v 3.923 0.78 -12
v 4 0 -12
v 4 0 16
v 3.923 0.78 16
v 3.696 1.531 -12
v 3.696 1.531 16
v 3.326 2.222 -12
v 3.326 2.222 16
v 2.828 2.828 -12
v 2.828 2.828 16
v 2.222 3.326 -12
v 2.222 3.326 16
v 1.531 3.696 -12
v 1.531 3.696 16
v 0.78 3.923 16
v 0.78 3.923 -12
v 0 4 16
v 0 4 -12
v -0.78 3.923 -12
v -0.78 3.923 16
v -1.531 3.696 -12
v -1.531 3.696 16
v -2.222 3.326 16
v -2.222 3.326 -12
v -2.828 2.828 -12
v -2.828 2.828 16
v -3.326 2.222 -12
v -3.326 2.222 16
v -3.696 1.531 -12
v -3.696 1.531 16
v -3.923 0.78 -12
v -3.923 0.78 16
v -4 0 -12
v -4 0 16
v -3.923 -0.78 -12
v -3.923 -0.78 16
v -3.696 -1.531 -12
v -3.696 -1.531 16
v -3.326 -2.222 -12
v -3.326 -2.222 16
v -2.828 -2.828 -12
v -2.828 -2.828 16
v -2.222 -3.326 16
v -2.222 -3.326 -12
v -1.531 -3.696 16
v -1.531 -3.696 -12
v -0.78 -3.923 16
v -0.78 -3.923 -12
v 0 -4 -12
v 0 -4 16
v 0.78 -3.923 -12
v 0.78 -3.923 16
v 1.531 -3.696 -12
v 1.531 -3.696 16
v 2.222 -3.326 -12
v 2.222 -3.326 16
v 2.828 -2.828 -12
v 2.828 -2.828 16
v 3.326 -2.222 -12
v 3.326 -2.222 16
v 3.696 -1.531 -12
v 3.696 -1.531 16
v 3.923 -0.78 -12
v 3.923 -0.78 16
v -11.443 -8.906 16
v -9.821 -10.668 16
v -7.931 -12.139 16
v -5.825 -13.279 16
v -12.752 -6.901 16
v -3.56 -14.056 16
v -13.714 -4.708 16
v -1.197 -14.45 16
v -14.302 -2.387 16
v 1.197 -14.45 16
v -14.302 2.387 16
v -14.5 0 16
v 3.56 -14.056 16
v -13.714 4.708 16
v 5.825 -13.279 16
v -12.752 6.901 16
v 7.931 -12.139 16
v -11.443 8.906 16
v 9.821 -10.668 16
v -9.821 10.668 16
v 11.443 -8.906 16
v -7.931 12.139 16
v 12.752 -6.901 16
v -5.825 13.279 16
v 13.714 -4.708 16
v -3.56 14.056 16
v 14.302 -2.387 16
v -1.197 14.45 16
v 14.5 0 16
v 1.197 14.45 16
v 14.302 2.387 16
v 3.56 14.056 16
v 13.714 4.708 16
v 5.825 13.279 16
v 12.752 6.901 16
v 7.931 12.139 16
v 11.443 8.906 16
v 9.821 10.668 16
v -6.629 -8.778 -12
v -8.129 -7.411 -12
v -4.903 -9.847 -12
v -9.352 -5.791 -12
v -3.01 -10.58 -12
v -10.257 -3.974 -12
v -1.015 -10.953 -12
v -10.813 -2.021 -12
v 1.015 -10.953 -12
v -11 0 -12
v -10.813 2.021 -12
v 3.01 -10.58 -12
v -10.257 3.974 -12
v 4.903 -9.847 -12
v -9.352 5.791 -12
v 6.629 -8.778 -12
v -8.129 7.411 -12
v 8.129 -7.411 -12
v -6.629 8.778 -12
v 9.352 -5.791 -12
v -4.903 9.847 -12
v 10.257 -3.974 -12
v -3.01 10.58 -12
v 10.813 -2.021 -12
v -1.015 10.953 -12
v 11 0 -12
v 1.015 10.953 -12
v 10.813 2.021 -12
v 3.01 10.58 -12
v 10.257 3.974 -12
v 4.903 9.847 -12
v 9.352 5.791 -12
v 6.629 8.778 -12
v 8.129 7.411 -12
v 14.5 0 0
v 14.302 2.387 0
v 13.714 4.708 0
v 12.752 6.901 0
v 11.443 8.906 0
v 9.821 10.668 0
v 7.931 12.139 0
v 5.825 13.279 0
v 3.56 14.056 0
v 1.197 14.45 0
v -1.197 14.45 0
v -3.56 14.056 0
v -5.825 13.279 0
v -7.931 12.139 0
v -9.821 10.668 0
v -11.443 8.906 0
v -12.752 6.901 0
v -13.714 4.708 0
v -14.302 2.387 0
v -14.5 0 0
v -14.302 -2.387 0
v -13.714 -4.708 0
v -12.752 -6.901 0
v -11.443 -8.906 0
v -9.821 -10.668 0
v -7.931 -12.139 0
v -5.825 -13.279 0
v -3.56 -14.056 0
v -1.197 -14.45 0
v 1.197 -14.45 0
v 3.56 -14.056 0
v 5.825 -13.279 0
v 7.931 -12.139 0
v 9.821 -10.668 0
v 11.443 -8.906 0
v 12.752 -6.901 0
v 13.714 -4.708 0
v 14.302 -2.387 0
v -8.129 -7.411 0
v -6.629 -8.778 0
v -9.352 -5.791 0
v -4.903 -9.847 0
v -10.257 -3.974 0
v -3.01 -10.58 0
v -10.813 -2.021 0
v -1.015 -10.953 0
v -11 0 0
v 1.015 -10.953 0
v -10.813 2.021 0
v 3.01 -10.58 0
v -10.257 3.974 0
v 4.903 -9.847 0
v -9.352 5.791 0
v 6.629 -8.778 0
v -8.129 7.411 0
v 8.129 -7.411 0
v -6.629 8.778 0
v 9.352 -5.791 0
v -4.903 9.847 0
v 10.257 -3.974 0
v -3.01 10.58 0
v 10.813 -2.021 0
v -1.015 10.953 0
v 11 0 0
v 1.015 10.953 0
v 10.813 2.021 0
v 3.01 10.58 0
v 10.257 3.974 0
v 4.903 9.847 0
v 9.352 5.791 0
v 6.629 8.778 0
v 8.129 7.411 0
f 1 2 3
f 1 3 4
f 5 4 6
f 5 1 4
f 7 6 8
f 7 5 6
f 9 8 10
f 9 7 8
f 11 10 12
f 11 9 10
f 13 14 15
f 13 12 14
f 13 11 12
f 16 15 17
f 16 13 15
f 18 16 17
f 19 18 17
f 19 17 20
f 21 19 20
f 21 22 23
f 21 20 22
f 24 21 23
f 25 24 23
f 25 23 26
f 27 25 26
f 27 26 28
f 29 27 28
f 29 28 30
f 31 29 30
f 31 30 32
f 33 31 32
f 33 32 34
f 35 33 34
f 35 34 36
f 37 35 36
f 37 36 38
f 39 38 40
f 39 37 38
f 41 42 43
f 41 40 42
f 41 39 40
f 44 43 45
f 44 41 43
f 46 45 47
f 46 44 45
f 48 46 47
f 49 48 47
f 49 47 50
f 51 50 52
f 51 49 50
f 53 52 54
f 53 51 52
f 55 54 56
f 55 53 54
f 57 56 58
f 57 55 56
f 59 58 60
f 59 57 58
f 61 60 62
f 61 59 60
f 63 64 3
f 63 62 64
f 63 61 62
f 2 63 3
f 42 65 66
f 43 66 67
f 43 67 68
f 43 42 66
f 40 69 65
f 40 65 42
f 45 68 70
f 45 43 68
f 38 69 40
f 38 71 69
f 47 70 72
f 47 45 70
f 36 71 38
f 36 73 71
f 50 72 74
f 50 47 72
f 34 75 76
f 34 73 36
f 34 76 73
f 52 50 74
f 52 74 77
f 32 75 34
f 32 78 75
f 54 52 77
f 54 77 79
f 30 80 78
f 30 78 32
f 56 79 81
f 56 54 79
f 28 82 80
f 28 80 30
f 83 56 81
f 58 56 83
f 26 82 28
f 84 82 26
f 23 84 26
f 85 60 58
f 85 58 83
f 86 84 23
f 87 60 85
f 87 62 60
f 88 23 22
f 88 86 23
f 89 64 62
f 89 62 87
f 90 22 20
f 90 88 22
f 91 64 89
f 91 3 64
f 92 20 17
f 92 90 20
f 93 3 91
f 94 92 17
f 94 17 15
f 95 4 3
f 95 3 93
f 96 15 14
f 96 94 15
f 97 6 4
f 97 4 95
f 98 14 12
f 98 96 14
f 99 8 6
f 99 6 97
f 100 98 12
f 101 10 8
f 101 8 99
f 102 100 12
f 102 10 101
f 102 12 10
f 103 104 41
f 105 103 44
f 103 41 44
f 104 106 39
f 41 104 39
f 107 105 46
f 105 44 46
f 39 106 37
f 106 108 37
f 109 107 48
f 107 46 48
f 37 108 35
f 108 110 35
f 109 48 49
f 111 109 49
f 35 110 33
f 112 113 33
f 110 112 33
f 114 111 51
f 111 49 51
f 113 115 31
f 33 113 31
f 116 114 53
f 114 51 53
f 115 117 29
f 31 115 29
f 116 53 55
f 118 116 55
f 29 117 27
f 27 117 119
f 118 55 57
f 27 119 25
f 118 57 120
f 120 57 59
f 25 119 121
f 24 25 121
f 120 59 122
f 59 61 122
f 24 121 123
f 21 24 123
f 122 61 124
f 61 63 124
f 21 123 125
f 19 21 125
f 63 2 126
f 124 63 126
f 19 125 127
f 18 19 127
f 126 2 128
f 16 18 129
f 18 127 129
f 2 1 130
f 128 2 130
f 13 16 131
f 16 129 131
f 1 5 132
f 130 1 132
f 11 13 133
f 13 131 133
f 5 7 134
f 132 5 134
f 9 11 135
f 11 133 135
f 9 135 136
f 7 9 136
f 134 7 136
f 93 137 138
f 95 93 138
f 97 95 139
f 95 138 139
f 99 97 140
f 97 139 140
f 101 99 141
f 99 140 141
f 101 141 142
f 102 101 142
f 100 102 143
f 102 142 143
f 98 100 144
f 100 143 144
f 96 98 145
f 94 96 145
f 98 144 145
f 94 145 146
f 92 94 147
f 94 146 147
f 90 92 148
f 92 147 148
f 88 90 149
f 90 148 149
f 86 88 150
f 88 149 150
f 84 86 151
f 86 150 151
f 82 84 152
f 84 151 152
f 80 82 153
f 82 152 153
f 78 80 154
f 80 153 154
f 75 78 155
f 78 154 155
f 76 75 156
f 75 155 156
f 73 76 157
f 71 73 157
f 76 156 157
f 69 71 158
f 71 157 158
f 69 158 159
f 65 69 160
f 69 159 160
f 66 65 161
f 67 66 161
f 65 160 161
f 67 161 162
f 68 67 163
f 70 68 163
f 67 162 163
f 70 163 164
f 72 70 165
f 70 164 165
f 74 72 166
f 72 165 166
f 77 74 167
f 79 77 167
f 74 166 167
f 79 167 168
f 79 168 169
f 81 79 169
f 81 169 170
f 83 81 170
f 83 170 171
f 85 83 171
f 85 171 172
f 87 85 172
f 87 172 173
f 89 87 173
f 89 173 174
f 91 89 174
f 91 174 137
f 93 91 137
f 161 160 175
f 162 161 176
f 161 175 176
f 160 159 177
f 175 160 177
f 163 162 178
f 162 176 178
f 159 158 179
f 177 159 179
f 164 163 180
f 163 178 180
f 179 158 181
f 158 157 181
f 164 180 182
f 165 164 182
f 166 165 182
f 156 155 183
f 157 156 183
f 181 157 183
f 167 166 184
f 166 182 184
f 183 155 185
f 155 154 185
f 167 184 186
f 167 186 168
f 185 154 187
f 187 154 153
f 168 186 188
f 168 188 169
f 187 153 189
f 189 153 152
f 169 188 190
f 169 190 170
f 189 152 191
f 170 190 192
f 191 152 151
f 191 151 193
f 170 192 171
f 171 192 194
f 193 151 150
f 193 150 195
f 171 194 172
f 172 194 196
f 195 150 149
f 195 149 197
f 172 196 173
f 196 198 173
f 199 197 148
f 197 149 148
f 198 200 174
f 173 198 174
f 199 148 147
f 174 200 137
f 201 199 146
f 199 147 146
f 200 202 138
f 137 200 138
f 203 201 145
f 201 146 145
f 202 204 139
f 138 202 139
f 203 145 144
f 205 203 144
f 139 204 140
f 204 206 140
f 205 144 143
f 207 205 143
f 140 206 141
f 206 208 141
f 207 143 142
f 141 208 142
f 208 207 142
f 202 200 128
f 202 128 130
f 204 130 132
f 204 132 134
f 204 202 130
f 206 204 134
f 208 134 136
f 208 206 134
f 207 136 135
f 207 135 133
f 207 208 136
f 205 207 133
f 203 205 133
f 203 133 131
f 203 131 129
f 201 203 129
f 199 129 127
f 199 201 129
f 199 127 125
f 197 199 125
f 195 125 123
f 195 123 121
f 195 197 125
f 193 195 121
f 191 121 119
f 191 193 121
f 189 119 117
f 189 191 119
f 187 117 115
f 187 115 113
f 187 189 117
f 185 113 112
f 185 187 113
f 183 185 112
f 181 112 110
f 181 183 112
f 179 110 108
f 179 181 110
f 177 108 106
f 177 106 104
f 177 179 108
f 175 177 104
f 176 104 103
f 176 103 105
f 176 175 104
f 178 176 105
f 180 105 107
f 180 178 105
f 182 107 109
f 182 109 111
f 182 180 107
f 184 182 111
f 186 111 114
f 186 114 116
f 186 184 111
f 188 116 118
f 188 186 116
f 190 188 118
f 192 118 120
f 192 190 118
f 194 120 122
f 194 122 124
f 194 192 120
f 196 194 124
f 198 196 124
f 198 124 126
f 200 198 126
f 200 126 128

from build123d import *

# Parameters (mm, degrees)
SKETCH1_R               = 14.5
BOSS_EXTRUDE1_DEPTH     = 16
SKETCH2_R               = 11
BOSS_EXTRUDE2_DEPTH     = 12
CUT_EXTRUDE1_DEPTH      = 27.009613607
CUT_EXTRUDE1_DEPTH_BACK = 27.009613607
SKETCH3_R               = 4


with BuildPart() as part:
    # Sketch1 → Boss-Extrude1 (new body)
    with BuildSketch(Plane.XY):
        Circle(SKETCH1_R)
    extrude(amount=BOSS_EXTRUDE1_DEPTH)

    # Sketch2 → Boss-Extrude2 (add)
    with BuildSketch(Plane.XY):
        Circle(SKETCH2_R)
    extrude(amount=-BOSS_EXTRUDE2_DEPTH)

    # Sketch3 → Cut-Extrude1 (cut, two sides: drawn at the far end of the back side and taken through both)
    with BuildSketch(Plane.XY.offset(-CUT_EXTRUDE1_DEPTH_BACK)):
        Circle(SKETCH3_R)
    extrude(amount=CUT_EXTRUDE1_DEPTH + CUT_EXTRUDE1_DEPTH_BACK, mode=Mode.SUBTRACT)


solid = part.part
